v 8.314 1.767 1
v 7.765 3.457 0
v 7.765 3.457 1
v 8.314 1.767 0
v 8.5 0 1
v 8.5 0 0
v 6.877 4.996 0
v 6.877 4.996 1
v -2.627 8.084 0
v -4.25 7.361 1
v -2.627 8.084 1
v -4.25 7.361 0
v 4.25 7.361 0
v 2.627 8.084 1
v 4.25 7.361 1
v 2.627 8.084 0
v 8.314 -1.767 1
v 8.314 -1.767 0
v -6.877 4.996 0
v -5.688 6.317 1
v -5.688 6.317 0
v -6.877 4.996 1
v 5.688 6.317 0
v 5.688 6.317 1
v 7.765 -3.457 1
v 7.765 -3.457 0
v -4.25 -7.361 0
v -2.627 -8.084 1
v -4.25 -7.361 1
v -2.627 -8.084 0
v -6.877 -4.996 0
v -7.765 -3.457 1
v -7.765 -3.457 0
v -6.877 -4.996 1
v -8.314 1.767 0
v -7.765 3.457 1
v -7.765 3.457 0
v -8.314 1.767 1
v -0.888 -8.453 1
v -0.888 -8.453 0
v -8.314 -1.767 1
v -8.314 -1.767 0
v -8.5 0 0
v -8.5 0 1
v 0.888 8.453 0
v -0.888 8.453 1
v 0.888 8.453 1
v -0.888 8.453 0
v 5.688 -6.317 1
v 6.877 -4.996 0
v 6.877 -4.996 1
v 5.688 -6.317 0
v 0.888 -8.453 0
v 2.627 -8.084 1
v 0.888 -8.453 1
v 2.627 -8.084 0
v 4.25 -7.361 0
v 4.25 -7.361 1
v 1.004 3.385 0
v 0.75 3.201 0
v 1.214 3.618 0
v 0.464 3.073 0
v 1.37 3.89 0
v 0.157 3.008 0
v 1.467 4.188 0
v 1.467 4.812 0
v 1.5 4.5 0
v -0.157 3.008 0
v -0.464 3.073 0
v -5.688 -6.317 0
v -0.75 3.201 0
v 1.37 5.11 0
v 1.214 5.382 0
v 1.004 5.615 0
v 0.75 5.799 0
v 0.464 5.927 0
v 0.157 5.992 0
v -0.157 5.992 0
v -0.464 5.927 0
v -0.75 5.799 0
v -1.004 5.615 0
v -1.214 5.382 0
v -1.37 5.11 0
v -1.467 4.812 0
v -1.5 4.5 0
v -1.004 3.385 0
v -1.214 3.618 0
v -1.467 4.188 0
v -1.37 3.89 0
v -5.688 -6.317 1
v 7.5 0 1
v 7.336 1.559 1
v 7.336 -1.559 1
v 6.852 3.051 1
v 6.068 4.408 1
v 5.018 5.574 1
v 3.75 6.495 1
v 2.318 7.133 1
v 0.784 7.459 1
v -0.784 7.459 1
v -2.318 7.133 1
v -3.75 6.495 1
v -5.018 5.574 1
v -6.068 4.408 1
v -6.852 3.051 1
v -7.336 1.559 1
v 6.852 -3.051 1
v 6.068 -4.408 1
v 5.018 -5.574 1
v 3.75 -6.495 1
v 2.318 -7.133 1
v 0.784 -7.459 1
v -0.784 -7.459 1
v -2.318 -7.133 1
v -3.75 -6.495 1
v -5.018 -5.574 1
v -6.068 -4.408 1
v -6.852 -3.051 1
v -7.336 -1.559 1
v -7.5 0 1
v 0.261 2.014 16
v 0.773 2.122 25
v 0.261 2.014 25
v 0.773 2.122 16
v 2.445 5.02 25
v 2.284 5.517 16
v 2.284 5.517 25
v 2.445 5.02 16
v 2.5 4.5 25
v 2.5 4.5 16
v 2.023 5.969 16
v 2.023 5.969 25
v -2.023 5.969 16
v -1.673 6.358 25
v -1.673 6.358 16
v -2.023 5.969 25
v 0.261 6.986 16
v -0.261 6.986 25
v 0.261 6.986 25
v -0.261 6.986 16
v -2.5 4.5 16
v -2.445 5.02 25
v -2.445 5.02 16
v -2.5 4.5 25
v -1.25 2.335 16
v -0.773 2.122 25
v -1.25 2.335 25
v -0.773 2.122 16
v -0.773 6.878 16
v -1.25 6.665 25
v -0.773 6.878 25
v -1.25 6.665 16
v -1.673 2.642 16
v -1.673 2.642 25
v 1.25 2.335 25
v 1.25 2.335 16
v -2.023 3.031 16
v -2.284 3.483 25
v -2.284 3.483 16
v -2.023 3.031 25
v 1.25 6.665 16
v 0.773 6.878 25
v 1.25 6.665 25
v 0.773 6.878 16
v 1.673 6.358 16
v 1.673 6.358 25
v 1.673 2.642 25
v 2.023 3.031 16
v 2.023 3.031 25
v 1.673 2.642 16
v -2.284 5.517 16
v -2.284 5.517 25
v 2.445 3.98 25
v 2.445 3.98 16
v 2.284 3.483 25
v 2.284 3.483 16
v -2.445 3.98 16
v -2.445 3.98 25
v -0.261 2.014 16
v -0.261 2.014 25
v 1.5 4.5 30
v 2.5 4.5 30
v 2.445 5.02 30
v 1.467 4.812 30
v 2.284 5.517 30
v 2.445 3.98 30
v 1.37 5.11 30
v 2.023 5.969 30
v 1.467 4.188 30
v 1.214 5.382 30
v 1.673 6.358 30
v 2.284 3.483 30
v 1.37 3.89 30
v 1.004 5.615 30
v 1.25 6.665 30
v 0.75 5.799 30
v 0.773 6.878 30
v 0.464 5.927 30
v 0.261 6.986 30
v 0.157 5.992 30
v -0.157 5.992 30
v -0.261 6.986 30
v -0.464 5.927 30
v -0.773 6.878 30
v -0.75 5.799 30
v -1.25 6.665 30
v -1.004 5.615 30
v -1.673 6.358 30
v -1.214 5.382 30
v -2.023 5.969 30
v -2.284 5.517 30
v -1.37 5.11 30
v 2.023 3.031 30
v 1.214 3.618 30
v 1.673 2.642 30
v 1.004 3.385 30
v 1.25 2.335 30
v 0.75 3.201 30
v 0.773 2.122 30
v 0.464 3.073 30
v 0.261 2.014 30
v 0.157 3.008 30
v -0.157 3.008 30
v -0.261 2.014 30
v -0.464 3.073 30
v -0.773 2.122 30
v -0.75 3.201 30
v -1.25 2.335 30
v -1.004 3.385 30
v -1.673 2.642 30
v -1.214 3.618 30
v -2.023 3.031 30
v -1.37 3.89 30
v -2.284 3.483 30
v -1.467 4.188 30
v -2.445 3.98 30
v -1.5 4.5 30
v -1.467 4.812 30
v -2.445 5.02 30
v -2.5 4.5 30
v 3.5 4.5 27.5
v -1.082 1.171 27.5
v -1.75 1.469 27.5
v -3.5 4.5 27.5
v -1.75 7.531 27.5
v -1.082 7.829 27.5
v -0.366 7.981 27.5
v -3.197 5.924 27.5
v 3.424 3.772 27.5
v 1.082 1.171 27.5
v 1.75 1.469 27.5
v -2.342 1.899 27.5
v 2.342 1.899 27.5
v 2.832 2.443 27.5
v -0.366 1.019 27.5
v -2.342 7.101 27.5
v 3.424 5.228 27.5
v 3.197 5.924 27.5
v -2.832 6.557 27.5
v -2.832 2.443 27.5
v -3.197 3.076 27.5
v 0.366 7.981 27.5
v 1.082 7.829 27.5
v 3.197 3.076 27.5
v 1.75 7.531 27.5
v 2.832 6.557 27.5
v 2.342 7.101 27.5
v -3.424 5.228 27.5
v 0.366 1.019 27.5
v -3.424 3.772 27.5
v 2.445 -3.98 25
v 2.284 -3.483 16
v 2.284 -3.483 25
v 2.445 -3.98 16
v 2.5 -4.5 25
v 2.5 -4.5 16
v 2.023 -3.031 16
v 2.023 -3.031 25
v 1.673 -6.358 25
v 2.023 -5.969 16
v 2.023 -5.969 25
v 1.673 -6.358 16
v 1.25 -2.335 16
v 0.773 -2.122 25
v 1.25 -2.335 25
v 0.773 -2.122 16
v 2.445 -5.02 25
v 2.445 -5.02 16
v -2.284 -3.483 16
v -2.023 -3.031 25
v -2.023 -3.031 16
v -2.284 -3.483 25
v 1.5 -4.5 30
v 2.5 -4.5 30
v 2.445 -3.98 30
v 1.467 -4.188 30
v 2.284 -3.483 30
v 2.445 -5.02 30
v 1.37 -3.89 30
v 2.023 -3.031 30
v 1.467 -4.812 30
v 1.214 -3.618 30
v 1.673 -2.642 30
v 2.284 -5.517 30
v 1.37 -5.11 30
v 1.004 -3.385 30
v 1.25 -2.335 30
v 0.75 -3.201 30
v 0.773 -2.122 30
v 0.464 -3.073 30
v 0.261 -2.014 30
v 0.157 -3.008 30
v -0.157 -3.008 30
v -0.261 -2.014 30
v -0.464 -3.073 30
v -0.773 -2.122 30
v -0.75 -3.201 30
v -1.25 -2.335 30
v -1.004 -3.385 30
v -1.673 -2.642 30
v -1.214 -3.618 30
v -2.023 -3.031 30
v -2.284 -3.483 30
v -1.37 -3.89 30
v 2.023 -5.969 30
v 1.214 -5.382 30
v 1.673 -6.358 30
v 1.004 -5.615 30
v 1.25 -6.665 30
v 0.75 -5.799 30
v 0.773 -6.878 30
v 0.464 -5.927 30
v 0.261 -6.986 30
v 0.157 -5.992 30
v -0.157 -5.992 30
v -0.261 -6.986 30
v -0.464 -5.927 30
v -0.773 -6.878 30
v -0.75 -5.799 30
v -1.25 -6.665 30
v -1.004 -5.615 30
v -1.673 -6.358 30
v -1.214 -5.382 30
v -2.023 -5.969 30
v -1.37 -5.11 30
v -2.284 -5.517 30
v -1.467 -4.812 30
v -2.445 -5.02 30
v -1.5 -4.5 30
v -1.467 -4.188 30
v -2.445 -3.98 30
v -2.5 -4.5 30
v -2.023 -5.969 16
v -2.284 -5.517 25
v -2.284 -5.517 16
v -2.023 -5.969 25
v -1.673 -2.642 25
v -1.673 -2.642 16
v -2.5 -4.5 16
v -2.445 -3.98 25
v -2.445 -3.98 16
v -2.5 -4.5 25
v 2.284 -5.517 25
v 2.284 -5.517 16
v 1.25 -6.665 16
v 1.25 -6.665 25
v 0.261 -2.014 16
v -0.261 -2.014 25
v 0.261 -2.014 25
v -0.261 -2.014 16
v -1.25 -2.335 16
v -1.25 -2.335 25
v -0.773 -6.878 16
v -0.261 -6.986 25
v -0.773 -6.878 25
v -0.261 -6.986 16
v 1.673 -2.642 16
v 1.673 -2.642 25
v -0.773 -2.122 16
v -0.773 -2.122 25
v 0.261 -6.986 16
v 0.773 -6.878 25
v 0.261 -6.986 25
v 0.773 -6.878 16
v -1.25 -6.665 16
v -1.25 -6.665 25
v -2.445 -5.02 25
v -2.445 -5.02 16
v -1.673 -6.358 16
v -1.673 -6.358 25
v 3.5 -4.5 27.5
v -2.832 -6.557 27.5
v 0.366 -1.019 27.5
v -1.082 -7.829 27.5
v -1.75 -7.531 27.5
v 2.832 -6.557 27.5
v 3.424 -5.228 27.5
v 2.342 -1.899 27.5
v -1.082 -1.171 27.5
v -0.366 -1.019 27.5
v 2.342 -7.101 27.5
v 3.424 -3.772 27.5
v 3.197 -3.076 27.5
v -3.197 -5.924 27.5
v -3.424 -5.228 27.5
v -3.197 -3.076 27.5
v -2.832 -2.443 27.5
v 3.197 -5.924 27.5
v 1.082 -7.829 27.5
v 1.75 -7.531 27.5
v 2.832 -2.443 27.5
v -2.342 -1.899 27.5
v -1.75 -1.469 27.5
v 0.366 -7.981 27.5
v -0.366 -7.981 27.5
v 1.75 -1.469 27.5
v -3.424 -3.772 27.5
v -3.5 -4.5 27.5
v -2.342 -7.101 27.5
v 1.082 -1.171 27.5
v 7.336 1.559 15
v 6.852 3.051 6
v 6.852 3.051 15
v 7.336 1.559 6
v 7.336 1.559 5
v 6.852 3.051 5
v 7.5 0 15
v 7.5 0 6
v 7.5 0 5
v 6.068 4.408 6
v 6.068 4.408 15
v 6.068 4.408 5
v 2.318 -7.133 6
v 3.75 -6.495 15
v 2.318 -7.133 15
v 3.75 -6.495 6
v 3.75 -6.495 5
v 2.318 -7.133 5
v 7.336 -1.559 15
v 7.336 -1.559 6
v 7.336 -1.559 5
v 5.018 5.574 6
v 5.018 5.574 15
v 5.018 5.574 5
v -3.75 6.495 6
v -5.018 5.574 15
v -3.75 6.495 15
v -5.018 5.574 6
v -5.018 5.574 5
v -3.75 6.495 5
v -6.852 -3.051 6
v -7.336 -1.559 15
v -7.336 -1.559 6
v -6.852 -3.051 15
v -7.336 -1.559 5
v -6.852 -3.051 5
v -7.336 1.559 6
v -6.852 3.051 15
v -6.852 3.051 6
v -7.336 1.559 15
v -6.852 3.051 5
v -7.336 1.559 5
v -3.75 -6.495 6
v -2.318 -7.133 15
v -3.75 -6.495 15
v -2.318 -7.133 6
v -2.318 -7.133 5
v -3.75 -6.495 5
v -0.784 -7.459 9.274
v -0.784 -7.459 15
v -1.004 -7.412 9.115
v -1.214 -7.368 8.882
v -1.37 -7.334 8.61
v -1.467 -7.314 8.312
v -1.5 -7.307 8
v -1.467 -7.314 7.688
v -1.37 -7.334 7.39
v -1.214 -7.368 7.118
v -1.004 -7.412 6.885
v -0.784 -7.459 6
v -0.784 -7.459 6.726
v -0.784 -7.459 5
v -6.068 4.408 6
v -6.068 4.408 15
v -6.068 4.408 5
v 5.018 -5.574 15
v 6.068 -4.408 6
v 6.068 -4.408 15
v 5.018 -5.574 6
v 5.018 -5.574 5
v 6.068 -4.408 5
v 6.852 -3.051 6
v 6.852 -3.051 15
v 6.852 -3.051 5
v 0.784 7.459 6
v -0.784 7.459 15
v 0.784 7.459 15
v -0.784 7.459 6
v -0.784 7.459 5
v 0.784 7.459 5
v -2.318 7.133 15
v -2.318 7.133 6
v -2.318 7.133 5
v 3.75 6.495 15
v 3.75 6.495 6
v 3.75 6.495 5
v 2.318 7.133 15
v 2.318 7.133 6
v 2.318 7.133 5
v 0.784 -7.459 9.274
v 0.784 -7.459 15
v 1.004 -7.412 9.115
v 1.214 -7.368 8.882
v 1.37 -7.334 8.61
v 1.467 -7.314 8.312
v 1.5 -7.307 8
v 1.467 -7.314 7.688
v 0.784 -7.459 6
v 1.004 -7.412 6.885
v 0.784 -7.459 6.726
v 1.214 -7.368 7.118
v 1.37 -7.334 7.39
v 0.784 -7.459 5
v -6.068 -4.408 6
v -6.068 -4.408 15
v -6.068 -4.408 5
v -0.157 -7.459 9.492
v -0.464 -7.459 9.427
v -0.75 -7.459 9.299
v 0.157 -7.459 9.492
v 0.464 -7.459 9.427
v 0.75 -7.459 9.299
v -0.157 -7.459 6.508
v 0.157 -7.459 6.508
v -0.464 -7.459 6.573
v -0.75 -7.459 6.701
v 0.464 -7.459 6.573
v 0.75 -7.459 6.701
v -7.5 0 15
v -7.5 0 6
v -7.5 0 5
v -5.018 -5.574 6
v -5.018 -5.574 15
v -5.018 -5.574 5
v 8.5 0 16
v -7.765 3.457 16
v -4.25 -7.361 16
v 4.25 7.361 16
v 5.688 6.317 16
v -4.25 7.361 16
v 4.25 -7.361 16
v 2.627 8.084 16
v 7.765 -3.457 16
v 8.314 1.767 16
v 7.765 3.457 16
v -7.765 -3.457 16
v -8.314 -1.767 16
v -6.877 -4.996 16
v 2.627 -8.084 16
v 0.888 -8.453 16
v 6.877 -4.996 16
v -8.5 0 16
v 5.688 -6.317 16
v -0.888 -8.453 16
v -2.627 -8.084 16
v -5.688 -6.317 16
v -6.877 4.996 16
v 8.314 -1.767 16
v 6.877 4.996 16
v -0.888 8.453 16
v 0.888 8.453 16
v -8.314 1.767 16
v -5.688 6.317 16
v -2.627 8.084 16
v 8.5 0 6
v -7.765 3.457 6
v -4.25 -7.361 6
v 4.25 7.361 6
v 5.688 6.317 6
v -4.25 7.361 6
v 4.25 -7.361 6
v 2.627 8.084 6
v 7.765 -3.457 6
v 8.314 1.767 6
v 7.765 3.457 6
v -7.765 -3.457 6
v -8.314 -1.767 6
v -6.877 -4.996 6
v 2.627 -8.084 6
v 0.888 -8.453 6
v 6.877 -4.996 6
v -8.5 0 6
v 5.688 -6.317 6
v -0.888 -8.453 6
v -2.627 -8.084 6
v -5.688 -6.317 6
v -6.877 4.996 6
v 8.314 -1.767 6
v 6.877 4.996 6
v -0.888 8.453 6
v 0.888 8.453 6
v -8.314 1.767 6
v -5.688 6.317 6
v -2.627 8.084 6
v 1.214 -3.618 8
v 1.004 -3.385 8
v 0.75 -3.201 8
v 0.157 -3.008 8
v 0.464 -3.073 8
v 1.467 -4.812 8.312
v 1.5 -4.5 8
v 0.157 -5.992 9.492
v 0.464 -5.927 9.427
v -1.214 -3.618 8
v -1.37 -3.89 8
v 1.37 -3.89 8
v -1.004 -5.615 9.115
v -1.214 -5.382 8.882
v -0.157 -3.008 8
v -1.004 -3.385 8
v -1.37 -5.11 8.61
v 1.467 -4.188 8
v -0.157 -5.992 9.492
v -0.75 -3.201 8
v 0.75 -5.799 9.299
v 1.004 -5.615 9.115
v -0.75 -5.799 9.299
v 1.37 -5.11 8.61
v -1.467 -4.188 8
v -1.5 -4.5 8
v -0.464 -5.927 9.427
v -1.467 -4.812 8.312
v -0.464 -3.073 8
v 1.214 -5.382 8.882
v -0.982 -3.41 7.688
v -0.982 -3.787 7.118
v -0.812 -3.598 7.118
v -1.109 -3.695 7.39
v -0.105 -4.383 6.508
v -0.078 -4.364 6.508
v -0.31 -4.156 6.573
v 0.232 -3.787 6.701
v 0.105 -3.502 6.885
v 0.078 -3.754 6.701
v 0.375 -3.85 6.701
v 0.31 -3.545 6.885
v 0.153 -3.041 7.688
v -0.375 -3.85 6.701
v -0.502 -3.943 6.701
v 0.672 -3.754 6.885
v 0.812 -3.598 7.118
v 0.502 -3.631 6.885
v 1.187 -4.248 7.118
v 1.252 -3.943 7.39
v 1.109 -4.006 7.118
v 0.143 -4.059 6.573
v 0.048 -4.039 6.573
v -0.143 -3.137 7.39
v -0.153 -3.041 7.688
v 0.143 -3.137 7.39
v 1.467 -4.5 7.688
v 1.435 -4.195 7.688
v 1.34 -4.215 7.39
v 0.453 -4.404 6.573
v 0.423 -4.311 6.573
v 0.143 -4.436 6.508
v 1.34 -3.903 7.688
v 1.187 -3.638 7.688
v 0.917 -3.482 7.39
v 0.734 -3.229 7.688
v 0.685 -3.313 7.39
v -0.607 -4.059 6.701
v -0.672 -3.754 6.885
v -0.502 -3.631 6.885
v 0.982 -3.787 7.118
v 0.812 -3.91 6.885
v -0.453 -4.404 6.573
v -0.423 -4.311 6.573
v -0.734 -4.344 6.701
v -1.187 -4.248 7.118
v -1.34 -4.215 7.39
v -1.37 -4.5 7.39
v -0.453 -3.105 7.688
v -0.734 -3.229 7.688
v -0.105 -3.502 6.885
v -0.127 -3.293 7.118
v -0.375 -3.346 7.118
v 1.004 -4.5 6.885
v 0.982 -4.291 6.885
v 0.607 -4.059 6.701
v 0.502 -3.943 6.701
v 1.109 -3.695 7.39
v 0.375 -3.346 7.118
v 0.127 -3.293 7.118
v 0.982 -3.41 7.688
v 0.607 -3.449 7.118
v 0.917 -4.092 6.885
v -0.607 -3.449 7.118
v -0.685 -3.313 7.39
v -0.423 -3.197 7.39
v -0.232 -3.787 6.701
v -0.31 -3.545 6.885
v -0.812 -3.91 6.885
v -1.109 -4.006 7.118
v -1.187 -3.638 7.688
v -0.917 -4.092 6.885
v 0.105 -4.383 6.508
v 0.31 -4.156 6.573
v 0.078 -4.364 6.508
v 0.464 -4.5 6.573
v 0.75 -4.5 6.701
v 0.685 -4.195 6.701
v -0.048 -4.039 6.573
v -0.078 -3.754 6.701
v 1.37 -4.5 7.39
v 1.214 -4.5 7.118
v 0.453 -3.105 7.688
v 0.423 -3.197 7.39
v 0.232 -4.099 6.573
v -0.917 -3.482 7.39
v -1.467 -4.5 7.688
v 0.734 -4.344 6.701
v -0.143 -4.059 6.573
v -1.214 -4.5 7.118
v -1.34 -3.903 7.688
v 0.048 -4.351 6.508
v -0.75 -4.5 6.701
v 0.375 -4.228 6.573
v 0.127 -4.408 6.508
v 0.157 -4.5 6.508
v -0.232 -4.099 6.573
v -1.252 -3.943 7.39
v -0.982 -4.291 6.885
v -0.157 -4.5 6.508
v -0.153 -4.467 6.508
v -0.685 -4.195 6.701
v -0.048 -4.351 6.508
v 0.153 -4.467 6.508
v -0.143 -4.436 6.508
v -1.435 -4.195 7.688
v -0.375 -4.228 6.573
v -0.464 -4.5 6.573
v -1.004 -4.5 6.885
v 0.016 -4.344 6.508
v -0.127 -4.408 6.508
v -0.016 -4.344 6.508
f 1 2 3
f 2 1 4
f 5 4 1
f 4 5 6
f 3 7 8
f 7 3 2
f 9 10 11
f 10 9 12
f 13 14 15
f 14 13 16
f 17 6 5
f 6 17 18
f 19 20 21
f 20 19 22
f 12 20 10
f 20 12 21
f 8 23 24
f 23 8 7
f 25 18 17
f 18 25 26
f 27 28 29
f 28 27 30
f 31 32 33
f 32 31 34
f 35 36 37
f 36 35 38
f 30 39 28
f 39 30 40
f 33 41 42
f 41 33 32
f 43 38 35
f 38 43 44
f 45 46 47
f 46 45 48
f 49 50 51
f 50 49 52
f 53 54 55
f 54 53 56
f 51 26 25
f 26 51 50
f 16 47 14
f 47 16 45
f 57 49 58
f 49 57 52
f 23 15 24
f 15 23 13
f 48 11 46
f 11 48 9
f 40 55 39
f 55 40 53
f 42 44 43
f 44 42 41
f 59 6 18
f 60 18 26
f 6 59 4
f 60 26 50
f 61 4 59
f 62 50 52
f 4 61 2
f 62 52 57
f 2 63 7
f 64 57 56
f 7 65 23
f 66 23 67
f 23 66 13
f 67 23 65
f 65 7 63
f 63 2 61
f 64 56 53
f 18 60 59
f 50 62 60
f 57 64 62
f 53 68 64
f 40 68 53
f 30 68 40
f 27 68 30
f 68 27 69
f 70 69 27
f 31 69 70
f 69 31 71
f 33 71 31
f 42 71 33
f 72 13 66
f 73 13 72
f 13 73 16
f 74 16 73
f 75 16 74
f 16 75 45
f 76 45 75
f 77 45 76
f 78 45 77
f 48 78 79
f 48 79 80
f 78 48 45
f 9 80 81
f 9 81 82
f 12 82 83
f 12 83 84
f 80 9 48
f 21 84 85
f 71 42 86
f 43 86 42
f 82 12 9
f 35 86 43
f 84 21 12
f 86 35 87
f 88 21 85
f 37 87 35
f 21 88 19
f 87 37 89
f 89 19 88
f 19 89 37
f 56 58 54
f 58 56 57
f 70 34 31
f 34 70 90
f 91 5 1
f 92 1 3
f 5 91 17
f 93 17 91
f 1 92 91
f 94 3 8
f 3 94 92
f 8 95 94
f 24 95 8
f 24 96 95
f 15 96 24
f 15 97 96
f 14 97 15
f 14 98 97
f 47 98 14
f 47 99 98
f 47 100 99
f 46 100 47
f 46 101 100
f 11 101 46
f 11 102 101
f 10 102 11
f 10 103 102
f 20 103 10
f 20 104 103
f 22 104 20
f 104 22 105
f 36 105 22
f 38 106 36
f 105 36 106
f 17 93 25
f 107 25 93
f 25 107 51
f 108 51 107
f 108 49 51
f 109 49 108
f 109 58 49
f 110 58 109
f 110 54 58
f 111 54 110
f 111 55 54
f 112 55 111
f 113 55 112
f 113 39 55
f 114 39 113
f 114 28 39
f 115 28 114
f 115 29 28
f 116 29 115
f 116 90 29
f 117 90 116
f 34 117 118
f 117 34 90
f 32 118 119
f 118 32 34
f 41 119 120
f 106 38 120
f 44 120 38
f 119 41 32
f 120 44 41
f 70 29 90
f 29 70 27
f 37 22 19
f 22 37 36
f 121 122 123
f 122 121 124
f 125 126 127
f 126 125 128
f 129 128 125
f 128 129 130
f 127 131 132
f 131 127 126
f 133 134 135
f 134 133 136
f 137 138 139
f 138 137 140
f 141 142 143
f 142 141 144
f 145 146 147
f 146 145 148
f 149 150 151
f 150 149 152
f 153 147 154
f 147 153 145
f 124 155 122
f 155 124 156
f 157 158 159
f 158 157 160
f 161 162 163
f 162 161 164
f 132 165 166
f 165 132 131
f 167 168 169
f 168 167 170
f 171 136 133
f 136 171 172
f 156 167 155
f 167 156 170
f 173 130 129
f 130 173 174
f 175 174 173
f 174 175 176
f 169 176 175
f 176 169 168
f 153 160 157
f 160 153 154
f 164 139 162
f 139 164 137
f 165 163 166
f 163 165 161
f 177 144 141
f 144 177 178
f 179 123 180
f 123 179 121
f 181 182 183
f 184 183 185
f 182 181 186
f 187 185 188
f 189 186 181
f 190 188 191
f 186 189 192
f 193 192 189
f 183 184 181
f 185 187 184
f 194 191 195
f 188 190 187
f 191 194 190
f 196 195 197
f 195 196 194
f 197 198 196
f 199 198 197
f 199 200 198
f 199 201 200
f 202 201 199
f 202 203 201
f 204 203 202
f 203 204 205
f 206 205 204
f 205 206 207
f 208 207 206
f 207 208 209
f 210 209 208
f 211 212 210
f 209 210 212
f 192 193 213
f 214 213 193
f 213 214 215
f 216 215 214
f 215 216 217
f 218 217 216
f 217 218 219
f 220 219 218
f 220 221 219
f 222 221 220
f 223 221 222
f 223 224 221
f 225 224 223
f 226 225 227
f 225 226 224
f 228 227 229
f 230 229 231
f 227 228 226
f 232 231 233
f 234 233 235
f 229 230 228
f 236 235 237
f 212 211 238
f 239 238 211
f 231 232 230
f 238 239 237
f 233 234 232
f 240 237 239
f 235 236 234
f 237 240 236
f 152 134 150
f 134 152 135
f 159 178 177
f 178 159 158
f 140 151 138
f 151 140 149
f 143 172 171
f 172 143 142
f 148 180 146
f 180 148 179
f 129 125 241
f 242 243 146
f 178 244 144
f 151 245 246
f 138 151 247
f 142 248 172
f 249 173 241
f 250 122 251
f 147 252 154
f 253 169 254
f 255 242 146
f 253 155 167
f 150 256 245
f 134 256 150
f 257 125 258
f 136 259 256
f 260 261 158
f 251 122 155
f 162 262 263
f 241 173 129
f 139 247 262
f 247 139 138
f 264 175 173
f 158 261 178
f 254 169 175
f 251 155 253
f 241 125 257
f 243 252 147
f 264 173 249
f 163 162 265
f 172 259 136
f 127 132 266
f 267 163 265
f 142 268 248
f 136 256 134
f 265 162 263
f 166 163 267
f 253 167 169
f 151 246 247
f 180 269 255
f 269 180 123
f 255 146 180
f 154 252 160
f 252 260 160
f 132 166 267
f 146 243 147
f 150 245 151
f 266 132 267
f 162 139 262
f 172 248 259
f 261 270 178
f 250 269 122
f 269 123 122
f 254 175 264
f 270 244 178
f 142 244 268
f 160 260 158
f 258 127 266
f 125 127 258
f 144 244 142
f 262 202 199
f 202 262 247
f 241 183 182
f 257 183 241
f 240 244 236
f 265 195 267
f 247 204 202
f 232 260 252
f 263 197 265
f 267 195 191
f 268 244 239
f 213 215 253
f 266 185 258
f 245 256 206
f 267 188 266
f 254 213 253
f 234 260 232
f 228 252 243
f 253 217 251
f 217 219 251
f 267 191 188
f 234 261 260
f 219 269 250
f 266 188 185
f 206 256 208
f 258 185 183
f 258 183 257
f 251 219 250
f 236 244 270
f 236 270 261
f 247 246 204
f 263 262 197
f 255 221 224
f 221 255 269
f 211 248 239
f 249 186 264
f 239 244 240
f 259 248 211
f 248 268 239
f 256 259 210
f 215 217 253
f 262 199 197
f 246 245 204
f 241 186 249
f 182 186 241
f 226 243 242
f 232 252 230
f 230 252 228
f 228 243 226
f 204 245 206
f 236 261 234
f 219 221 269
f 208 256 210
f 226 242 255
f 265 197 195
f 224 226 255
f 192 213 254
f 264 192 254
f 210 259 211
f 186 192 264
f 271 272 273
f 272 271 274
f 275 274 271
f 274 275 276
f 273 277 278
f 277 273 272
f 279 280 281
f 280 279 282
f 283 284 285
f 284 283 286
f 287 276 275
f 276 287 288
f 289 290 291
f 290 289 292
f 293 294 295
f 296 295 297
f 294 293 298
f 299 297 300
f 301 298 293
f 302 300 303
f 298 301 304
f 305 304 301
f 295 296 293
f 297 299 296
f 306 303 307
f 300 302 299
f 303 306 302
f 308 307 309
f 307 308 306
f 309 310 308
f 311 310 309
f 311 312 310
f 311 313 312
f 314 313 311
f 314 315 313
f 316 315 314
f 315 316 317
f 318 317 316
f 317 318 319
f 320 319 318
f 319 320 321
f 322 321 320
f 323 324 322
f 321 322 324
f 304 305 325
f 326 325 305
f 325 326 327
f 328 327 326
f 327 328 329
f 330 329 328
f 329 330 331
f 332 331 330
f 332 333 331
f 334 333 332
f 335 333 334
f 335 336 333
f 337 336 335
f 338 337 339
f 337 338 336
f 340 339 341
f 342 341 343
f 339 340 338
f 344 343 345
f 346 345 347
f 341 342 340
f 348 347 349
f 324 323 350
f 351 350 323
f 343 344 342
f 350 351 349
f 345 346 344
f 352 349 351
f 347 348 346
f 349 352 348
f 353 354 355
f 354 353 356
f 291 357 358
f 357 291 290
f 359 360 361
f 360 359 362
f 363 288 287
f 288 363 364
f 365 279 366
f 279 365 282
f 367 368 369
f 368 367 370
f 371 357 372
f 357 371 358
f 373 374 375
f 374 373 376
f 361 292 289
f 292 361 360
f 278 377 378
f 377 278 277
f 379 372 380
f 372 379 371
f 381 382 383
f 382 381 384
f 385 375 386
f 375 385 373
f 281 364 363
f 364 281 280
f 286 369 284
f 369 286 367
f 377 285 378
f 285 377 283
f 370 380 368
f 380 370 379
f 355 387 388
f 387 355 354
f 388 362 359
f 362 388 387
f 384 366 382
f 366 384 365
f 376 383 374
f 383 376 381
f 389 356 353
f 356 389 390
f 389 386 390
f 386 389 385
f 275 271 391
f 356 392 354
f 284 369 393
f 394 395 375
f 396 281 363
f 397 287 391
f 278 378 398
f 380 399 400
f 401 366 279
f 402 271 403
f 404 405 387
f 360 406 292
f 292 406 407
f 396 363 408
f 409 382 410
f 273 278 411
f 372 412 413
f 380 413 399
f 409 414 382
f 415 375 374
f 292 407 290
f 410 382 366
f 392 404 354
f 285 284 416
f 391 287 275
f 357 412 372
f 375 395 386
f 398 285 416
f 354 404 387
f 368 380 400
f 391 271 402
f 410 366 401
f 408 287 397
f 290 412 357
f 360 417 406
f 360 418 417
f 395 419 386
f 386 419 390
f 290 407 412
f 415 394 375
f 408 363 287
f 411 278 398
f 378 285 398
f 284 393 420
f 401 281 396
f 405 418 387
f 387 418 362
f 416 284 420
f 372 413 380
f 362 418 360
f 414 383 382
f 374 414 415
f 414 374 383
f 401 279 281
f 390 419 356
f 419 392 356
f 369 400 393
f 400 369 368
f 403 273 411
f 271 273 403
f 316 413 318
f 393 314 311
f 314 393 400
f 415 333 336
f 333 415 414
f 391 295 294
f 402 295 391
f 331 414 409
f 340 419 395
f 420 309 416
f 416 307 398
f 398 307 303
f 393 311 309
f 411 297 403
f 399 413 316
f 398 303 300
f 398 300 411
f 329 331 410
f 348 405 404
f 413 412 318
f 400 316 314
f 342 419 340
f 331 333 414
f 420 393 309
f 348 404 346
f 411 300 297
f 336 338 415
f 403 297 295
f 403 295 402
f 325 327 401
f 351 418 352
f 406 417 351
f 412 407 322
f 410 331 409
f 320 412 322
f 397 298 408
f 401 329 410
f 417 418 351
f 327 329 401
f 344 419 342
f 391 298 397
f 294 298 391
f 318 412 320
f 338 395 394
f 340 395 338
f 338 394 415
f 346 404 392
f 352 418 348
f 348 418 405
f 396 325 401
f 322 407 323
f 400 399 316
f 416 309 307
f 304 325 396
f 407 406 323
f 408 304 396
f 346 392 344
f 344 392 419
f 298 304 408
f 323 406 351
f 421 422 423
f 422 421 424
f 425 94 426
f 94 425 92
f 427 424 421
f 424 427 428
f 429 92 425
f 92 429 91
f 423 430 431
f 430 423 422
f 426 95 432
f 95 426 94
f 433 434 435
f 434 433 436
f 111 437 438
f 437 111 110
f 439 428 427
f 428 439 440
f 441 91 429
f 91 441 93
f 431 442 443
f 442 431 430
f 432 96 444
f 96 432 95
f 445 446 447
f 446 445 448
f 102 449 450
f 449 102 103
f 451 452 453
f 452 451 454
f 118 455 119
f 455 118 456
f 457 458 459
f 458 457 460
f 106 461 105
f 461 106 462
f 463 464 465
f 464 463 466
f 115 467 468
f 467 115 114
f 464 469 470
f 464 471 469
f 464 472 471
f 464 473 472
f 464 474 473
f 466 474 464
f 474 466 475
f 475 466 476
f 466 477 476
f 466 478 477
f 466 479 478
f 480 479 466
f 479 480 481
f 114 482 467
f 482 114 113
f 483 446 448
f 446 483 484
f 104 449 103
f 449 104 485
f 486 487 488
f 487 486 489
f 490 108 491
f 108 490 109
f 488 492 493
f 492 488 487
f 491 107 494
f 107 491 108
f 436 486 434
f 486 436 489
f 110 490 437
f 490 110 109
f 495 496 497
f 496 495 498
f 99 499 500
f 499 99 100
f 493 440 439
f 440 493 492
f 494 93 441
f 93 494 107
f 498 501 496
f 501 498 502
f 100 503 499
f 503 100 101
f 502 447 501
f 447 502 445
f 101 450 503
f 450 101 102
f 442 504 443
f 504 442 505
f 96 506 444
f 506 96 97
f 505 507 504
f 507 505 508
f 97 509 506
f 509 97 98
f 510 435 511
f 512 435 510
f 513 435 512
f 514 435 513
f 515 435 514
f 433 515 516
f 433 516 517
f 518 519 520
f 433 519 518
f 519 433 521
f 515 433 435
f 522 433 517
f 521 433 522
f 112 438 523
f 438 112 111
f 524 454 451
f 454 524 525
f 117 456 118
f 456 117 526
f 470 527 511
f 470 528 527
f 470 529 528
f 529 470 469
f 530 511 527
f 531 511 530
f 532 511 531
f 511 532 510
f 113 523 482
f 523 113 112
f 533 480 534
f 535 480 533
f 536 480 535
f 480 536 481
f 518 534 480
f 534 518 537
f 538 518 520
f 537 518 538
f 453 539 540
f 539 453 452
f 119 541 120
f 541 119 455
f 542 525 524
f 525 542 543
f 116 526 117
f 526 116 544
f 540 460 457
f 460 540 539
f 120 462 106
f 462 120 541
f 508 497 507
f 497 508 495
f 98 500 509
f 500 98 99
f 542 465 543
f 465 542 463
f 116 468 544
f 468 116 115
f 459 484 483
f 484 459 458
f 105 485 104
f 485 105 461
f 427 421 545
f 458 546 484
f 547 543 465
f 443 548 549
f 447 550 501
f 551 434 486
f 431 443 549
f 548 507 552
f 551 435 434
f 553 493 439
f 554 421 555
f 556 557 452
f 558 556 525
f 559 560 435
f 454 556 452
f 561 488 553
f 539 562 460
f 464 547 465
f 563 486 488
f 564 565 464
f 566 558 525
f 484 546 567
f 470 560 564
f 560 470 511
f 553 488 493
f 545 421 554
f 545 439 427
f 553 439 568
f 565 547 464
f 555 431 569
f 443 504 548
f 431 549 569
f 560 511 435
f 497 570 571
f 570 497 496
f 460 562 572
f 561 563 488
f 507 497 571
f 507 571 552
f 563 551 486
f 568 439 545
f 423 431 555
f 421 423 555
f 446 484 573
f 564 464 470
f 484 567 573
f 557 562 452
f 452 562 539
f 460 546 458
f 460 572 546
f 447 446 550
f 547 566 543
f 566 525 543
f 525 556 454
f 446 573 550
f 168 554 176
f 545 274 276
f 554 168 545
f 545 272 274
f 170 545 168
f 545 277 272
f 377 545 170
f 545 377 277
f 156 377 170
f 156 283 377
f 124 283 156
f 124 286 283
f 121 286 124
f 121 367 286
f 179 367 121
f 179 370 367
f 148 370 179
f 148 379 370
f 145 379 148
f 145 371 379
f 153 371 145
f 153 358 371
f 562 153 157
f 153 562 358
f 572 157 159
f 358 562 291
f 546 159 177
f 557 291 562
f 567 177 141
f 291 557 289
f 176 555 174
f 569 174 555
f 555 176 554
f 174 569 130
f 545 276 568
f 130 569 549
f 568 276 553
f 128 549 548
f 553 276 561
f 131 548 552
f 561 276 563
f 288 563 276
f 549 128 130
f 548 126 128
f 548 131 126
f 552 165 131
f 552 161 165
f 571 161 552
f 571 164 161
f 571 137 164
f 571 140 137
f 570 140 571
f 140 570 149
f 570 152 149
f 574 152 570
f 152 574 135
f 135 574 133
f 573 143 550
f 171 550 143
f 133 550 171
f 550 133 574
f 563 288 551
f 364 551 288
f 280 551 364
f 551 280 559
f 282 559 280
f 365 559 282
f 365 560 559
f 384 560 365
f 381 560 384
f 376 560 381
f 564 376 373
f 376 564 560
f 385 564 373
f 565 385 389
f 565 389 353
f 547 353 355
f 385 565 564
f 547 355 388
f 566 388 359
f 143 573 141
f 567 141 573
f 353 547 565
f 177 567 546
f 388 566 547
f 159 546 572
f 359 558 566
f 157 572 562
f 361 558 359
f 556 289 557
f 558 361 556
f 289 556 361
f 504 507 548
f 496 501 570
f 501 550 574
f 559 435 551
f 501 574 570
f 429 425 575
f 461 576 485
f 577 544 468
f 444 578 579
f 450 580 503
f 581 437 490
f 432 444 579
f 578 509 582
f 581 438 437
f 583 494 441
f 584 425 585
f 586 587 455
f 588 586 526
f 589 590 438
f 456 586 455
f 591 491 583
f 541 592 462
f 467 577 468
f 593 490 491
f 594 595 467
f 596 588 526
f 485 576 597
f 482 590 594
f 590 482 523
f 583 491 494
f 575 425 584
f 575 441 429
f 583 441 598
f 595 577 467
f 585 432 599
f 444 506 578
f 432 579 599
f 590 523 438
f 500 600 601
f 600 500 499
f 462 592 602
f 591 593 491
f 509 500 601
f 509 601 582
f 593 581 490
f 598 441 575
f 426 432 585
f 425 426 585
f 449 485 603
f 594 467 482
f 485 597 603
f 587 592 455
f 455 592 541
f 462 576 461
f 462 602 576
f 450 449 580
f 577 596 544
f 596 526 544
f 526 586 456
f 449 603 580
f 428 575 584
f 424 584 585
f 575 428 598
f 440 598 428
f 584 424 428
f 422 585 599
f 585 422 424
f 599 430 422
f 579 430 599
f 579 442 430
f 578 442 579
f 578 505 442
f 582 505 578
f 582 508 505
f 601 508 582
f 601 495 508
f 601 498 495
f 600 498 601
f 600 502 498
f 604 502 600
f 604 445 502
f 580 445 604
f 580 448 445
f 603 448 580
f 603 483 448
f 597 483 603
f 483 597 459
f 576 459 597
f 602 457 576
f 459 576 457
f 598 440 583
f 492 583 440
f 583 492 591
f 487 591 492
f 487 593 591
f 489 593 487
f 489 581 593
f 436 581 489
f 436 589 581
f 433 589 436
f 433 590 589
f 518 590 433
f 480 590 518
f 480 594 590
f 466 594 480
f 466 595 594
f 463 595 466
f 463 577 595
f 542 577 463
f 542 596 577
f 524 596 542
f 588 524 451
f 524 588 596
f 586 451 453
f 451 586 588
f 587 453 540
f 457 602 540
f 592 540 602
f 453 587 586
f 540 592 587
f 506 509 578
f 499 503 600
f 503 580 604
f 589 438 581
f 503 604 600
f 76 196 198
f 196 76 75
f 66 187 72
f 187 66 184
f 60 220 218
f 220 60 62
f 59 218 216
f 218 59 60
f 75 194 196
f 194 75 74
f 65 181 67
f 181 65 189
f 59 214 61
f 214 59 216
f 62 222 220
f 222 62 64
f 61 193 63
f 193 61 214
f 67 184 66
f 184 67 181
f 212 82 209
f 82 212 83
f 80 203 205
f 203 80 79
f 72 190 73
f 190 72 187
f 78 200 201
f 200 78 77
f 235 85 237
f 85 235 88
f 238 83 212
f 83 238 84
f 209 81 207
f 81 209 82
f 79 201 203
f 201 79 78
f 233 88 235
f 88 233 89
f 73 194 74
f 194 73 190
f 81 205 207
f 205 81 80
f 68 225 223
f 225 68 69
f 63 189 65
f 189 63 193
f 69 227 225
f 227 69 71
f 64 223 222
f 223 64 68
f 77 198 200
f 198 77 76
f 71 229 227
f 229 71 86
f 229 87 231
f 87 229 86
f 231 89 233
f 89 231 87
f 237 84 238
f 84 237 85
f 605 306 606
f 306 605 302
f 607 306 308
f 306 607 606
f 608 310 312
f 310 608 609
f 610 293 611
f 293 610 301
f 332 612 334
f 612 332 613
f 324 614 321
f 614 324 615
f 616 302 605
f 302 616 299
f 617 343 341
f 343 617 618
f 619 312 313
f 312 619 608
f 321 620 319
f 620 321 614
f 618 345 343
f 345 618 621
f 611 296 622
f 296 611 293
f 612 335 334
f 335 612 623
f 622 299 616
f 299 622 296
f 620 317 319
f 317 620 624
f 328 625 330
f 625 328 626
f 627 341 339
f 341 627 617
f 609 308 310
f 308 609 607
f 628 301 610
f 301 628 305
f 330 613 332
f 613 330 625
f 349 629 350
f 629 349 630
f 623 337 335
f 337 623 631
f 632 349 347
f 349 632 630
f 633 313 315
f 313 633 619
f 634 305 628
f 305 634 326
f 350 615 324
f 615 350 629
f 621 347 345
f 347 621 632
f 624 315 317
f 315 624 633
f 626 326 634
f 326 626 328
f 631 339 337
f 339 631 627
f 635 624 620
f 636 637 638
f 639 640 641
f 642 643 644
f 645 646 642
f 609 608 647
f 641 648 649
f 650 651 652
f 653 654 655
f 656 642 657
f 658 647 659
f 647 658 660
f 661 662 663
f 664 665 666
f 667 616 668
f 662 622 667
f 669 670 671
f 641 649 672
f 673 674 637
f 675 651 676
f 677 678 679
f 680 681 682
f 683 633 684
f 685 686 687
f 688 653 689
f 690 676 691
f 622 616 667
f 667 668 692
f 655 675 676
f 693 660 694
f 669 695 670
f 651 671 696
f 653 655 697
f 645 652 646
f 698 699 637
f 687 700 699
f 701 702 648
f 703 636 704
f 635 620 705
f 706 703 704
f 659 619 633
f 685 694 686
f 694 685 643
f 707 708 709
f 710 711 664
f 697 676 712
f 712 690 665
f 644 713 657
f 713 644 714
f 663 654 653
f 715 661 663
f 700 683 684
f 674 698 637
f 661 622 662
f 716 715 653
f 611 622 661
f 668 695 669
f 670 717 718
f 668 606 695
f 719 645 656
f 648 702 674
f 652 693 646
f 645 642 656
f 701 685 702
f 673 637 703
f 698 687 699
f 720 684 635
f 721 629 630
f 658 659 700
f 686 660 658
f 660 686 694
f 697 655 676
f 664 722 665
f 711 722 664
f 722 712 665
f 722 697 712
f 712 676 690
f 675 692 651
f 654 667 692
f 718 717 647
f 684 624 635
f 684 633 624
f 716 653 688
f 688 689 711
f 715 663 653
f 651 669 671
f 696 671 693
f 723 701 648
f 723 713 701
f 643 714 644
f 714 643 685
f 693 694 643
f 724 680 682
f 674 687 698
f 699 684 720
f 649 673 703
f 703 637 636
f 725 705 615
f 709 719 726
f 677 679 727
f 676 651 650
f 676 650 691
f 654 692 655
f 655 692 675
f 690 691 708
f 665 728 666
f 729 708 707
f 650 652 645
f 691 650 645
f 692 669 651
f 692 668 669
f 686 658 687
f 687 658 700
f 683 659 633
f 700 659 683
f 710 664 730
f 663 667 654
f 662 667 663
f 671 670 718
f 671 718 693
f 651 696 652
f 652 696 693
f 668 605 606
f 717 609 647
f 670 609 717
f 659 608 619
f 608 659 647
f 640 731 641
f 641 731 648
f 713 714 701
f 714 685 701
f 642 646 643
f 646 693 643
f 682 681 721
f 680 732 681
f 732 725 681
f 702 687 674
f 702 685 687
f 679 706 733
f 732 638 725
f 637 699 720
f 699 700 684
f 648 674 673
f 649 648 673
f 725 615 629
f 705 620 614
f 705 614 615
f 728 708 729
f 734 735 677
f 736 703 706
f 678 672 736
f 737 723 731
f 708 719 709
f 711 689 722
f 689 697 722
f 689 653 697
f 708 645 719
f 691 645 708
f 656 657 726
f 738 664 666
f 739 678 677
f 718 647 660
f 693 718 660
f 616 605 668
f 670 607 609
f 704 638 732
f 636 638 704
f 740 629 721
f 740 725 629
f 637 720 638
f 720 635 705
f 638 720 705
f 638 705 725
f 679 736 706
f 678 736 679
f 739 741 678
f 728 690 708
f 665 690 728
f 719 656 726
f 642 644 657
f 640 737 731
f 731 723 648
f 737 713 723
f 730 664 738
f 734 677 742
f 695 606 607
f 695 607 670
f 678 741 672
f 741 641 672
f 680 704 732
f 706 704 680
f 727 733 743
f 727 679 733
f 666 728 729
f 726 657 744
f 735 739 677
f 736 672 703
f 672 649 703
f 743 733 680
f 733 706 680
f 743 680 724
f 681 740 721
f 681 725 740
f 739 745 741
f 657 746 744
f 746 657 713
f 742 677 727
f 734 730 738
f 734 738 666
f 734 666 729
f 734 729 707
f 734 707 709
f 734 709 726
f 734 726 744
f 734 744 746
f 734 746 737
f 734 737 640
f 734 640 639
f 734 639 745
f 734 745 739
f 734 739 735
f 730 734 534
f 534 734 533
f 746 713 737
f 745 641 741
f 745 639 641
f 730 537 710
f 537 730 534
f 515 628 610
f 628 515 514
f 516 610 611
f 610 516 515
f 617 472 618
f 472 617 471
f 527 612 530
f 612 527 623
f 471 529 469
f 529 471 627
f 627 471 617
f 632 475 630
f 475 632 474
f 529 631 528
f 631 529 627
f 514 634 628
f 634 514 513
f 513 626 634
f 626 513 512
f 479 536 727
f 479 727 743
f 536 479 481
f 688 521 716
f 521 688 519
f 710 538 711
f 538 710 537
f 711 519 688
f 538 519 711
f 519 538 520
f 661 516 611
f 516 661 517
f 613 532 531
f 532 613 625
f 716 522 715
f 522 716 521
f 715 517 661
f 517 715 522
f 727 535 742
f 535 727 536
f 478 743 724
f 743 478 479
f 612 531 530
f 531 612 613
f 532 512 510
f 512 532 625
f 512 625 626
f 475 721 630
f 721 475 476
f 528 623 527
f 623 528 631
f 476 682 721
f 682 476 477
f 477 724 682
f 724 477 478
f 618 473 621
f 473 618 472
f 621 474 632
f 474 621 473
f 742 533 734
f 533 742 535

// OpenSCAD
pipe_max_radius = 5;
plug_max_radius = 8.5;
plug_taper = 0;
plug_depth = 15;

tube_inner_radius = 1.5;
tube_outer_radius = 2.5;

screw_radius = 2;
plug_thickness = 5;

$fn = 30;

module chamber_plug(tube_inner_radius = tube_inner_radius, plug_depth = plug_depth, plug_taper = plug_taper, plug_max_radius = plug_max_radius) {
    difference() {
        union() {
            cylinder(r = plug_max_radius - plug_taper, h = 1, $fn=$fn);
            translate([0, 4.5, 0]) cylinder(r = tube_outer_radius, h = 30, $fn=$fn);
            translate([0, 4.5, 25]) cylinder(r1 = tube_outer_radius, r2 = tube_outer_radius + 1, h = 2.5, $fn=$fn);
            translate([0, 4.5, 27.5]) cylinder(r2 = tube_outer_radius, r1 = tube_outer_radius + 1, h = 2.5, $fn=$fn);
            translate([0, -4.5, 0]) cylinder(r = tube_outer_radius, h = 30, $fn=$fn);
            translate([0, -4.5, 25]) cylinder(r1 = tube_outer_radius, r2 = tube_outer_radius + 1, h = 2.5, $fn=$fn);
            translate([0, -4.5, 27.5]) cylinder(r2 = tube_outer_radius, r1 = tube_outer_radius + 1, h = 2.5, $fn=$fn);
            cylinder(r = plug_max_radius - plug_taper - 1, h = plug_depth, $fn=$fn);
            translate([0, 0, plug_depth - plug_taper]) cylinder(r1 = plug_max_radius - plug_taper - 1, r2 = plug_max_radius, h = plug_taper + 1, $fn=$fn);
            translate([0, 0, (plug_depth / 3) - plug_taper]) cylinder(r1 = plug_max_radius - plug_taper - 1, r2 = plug_max_radius, h = plug_taper + 1, $fn=$fn);
        }
        union() {
            translate([0, 4.5, 0]) cylinder(r = tube_inner_radius, h = 30, $fn=$fn);
            translate([0, -4.5, 8]) cylinder(r = tube_inner_radius, h = 30, $fn=$fn);
            translate([0, -4.5, 8]) sphere(r = tube_inner_radius, $fn=$fn);
            translate([0, -4.5, 8]) rotate([90,0,0]) cylinder(r = tube_inner_radius, h = 30, $fn=$fn);
        }
    }
}

chamber_plug();
